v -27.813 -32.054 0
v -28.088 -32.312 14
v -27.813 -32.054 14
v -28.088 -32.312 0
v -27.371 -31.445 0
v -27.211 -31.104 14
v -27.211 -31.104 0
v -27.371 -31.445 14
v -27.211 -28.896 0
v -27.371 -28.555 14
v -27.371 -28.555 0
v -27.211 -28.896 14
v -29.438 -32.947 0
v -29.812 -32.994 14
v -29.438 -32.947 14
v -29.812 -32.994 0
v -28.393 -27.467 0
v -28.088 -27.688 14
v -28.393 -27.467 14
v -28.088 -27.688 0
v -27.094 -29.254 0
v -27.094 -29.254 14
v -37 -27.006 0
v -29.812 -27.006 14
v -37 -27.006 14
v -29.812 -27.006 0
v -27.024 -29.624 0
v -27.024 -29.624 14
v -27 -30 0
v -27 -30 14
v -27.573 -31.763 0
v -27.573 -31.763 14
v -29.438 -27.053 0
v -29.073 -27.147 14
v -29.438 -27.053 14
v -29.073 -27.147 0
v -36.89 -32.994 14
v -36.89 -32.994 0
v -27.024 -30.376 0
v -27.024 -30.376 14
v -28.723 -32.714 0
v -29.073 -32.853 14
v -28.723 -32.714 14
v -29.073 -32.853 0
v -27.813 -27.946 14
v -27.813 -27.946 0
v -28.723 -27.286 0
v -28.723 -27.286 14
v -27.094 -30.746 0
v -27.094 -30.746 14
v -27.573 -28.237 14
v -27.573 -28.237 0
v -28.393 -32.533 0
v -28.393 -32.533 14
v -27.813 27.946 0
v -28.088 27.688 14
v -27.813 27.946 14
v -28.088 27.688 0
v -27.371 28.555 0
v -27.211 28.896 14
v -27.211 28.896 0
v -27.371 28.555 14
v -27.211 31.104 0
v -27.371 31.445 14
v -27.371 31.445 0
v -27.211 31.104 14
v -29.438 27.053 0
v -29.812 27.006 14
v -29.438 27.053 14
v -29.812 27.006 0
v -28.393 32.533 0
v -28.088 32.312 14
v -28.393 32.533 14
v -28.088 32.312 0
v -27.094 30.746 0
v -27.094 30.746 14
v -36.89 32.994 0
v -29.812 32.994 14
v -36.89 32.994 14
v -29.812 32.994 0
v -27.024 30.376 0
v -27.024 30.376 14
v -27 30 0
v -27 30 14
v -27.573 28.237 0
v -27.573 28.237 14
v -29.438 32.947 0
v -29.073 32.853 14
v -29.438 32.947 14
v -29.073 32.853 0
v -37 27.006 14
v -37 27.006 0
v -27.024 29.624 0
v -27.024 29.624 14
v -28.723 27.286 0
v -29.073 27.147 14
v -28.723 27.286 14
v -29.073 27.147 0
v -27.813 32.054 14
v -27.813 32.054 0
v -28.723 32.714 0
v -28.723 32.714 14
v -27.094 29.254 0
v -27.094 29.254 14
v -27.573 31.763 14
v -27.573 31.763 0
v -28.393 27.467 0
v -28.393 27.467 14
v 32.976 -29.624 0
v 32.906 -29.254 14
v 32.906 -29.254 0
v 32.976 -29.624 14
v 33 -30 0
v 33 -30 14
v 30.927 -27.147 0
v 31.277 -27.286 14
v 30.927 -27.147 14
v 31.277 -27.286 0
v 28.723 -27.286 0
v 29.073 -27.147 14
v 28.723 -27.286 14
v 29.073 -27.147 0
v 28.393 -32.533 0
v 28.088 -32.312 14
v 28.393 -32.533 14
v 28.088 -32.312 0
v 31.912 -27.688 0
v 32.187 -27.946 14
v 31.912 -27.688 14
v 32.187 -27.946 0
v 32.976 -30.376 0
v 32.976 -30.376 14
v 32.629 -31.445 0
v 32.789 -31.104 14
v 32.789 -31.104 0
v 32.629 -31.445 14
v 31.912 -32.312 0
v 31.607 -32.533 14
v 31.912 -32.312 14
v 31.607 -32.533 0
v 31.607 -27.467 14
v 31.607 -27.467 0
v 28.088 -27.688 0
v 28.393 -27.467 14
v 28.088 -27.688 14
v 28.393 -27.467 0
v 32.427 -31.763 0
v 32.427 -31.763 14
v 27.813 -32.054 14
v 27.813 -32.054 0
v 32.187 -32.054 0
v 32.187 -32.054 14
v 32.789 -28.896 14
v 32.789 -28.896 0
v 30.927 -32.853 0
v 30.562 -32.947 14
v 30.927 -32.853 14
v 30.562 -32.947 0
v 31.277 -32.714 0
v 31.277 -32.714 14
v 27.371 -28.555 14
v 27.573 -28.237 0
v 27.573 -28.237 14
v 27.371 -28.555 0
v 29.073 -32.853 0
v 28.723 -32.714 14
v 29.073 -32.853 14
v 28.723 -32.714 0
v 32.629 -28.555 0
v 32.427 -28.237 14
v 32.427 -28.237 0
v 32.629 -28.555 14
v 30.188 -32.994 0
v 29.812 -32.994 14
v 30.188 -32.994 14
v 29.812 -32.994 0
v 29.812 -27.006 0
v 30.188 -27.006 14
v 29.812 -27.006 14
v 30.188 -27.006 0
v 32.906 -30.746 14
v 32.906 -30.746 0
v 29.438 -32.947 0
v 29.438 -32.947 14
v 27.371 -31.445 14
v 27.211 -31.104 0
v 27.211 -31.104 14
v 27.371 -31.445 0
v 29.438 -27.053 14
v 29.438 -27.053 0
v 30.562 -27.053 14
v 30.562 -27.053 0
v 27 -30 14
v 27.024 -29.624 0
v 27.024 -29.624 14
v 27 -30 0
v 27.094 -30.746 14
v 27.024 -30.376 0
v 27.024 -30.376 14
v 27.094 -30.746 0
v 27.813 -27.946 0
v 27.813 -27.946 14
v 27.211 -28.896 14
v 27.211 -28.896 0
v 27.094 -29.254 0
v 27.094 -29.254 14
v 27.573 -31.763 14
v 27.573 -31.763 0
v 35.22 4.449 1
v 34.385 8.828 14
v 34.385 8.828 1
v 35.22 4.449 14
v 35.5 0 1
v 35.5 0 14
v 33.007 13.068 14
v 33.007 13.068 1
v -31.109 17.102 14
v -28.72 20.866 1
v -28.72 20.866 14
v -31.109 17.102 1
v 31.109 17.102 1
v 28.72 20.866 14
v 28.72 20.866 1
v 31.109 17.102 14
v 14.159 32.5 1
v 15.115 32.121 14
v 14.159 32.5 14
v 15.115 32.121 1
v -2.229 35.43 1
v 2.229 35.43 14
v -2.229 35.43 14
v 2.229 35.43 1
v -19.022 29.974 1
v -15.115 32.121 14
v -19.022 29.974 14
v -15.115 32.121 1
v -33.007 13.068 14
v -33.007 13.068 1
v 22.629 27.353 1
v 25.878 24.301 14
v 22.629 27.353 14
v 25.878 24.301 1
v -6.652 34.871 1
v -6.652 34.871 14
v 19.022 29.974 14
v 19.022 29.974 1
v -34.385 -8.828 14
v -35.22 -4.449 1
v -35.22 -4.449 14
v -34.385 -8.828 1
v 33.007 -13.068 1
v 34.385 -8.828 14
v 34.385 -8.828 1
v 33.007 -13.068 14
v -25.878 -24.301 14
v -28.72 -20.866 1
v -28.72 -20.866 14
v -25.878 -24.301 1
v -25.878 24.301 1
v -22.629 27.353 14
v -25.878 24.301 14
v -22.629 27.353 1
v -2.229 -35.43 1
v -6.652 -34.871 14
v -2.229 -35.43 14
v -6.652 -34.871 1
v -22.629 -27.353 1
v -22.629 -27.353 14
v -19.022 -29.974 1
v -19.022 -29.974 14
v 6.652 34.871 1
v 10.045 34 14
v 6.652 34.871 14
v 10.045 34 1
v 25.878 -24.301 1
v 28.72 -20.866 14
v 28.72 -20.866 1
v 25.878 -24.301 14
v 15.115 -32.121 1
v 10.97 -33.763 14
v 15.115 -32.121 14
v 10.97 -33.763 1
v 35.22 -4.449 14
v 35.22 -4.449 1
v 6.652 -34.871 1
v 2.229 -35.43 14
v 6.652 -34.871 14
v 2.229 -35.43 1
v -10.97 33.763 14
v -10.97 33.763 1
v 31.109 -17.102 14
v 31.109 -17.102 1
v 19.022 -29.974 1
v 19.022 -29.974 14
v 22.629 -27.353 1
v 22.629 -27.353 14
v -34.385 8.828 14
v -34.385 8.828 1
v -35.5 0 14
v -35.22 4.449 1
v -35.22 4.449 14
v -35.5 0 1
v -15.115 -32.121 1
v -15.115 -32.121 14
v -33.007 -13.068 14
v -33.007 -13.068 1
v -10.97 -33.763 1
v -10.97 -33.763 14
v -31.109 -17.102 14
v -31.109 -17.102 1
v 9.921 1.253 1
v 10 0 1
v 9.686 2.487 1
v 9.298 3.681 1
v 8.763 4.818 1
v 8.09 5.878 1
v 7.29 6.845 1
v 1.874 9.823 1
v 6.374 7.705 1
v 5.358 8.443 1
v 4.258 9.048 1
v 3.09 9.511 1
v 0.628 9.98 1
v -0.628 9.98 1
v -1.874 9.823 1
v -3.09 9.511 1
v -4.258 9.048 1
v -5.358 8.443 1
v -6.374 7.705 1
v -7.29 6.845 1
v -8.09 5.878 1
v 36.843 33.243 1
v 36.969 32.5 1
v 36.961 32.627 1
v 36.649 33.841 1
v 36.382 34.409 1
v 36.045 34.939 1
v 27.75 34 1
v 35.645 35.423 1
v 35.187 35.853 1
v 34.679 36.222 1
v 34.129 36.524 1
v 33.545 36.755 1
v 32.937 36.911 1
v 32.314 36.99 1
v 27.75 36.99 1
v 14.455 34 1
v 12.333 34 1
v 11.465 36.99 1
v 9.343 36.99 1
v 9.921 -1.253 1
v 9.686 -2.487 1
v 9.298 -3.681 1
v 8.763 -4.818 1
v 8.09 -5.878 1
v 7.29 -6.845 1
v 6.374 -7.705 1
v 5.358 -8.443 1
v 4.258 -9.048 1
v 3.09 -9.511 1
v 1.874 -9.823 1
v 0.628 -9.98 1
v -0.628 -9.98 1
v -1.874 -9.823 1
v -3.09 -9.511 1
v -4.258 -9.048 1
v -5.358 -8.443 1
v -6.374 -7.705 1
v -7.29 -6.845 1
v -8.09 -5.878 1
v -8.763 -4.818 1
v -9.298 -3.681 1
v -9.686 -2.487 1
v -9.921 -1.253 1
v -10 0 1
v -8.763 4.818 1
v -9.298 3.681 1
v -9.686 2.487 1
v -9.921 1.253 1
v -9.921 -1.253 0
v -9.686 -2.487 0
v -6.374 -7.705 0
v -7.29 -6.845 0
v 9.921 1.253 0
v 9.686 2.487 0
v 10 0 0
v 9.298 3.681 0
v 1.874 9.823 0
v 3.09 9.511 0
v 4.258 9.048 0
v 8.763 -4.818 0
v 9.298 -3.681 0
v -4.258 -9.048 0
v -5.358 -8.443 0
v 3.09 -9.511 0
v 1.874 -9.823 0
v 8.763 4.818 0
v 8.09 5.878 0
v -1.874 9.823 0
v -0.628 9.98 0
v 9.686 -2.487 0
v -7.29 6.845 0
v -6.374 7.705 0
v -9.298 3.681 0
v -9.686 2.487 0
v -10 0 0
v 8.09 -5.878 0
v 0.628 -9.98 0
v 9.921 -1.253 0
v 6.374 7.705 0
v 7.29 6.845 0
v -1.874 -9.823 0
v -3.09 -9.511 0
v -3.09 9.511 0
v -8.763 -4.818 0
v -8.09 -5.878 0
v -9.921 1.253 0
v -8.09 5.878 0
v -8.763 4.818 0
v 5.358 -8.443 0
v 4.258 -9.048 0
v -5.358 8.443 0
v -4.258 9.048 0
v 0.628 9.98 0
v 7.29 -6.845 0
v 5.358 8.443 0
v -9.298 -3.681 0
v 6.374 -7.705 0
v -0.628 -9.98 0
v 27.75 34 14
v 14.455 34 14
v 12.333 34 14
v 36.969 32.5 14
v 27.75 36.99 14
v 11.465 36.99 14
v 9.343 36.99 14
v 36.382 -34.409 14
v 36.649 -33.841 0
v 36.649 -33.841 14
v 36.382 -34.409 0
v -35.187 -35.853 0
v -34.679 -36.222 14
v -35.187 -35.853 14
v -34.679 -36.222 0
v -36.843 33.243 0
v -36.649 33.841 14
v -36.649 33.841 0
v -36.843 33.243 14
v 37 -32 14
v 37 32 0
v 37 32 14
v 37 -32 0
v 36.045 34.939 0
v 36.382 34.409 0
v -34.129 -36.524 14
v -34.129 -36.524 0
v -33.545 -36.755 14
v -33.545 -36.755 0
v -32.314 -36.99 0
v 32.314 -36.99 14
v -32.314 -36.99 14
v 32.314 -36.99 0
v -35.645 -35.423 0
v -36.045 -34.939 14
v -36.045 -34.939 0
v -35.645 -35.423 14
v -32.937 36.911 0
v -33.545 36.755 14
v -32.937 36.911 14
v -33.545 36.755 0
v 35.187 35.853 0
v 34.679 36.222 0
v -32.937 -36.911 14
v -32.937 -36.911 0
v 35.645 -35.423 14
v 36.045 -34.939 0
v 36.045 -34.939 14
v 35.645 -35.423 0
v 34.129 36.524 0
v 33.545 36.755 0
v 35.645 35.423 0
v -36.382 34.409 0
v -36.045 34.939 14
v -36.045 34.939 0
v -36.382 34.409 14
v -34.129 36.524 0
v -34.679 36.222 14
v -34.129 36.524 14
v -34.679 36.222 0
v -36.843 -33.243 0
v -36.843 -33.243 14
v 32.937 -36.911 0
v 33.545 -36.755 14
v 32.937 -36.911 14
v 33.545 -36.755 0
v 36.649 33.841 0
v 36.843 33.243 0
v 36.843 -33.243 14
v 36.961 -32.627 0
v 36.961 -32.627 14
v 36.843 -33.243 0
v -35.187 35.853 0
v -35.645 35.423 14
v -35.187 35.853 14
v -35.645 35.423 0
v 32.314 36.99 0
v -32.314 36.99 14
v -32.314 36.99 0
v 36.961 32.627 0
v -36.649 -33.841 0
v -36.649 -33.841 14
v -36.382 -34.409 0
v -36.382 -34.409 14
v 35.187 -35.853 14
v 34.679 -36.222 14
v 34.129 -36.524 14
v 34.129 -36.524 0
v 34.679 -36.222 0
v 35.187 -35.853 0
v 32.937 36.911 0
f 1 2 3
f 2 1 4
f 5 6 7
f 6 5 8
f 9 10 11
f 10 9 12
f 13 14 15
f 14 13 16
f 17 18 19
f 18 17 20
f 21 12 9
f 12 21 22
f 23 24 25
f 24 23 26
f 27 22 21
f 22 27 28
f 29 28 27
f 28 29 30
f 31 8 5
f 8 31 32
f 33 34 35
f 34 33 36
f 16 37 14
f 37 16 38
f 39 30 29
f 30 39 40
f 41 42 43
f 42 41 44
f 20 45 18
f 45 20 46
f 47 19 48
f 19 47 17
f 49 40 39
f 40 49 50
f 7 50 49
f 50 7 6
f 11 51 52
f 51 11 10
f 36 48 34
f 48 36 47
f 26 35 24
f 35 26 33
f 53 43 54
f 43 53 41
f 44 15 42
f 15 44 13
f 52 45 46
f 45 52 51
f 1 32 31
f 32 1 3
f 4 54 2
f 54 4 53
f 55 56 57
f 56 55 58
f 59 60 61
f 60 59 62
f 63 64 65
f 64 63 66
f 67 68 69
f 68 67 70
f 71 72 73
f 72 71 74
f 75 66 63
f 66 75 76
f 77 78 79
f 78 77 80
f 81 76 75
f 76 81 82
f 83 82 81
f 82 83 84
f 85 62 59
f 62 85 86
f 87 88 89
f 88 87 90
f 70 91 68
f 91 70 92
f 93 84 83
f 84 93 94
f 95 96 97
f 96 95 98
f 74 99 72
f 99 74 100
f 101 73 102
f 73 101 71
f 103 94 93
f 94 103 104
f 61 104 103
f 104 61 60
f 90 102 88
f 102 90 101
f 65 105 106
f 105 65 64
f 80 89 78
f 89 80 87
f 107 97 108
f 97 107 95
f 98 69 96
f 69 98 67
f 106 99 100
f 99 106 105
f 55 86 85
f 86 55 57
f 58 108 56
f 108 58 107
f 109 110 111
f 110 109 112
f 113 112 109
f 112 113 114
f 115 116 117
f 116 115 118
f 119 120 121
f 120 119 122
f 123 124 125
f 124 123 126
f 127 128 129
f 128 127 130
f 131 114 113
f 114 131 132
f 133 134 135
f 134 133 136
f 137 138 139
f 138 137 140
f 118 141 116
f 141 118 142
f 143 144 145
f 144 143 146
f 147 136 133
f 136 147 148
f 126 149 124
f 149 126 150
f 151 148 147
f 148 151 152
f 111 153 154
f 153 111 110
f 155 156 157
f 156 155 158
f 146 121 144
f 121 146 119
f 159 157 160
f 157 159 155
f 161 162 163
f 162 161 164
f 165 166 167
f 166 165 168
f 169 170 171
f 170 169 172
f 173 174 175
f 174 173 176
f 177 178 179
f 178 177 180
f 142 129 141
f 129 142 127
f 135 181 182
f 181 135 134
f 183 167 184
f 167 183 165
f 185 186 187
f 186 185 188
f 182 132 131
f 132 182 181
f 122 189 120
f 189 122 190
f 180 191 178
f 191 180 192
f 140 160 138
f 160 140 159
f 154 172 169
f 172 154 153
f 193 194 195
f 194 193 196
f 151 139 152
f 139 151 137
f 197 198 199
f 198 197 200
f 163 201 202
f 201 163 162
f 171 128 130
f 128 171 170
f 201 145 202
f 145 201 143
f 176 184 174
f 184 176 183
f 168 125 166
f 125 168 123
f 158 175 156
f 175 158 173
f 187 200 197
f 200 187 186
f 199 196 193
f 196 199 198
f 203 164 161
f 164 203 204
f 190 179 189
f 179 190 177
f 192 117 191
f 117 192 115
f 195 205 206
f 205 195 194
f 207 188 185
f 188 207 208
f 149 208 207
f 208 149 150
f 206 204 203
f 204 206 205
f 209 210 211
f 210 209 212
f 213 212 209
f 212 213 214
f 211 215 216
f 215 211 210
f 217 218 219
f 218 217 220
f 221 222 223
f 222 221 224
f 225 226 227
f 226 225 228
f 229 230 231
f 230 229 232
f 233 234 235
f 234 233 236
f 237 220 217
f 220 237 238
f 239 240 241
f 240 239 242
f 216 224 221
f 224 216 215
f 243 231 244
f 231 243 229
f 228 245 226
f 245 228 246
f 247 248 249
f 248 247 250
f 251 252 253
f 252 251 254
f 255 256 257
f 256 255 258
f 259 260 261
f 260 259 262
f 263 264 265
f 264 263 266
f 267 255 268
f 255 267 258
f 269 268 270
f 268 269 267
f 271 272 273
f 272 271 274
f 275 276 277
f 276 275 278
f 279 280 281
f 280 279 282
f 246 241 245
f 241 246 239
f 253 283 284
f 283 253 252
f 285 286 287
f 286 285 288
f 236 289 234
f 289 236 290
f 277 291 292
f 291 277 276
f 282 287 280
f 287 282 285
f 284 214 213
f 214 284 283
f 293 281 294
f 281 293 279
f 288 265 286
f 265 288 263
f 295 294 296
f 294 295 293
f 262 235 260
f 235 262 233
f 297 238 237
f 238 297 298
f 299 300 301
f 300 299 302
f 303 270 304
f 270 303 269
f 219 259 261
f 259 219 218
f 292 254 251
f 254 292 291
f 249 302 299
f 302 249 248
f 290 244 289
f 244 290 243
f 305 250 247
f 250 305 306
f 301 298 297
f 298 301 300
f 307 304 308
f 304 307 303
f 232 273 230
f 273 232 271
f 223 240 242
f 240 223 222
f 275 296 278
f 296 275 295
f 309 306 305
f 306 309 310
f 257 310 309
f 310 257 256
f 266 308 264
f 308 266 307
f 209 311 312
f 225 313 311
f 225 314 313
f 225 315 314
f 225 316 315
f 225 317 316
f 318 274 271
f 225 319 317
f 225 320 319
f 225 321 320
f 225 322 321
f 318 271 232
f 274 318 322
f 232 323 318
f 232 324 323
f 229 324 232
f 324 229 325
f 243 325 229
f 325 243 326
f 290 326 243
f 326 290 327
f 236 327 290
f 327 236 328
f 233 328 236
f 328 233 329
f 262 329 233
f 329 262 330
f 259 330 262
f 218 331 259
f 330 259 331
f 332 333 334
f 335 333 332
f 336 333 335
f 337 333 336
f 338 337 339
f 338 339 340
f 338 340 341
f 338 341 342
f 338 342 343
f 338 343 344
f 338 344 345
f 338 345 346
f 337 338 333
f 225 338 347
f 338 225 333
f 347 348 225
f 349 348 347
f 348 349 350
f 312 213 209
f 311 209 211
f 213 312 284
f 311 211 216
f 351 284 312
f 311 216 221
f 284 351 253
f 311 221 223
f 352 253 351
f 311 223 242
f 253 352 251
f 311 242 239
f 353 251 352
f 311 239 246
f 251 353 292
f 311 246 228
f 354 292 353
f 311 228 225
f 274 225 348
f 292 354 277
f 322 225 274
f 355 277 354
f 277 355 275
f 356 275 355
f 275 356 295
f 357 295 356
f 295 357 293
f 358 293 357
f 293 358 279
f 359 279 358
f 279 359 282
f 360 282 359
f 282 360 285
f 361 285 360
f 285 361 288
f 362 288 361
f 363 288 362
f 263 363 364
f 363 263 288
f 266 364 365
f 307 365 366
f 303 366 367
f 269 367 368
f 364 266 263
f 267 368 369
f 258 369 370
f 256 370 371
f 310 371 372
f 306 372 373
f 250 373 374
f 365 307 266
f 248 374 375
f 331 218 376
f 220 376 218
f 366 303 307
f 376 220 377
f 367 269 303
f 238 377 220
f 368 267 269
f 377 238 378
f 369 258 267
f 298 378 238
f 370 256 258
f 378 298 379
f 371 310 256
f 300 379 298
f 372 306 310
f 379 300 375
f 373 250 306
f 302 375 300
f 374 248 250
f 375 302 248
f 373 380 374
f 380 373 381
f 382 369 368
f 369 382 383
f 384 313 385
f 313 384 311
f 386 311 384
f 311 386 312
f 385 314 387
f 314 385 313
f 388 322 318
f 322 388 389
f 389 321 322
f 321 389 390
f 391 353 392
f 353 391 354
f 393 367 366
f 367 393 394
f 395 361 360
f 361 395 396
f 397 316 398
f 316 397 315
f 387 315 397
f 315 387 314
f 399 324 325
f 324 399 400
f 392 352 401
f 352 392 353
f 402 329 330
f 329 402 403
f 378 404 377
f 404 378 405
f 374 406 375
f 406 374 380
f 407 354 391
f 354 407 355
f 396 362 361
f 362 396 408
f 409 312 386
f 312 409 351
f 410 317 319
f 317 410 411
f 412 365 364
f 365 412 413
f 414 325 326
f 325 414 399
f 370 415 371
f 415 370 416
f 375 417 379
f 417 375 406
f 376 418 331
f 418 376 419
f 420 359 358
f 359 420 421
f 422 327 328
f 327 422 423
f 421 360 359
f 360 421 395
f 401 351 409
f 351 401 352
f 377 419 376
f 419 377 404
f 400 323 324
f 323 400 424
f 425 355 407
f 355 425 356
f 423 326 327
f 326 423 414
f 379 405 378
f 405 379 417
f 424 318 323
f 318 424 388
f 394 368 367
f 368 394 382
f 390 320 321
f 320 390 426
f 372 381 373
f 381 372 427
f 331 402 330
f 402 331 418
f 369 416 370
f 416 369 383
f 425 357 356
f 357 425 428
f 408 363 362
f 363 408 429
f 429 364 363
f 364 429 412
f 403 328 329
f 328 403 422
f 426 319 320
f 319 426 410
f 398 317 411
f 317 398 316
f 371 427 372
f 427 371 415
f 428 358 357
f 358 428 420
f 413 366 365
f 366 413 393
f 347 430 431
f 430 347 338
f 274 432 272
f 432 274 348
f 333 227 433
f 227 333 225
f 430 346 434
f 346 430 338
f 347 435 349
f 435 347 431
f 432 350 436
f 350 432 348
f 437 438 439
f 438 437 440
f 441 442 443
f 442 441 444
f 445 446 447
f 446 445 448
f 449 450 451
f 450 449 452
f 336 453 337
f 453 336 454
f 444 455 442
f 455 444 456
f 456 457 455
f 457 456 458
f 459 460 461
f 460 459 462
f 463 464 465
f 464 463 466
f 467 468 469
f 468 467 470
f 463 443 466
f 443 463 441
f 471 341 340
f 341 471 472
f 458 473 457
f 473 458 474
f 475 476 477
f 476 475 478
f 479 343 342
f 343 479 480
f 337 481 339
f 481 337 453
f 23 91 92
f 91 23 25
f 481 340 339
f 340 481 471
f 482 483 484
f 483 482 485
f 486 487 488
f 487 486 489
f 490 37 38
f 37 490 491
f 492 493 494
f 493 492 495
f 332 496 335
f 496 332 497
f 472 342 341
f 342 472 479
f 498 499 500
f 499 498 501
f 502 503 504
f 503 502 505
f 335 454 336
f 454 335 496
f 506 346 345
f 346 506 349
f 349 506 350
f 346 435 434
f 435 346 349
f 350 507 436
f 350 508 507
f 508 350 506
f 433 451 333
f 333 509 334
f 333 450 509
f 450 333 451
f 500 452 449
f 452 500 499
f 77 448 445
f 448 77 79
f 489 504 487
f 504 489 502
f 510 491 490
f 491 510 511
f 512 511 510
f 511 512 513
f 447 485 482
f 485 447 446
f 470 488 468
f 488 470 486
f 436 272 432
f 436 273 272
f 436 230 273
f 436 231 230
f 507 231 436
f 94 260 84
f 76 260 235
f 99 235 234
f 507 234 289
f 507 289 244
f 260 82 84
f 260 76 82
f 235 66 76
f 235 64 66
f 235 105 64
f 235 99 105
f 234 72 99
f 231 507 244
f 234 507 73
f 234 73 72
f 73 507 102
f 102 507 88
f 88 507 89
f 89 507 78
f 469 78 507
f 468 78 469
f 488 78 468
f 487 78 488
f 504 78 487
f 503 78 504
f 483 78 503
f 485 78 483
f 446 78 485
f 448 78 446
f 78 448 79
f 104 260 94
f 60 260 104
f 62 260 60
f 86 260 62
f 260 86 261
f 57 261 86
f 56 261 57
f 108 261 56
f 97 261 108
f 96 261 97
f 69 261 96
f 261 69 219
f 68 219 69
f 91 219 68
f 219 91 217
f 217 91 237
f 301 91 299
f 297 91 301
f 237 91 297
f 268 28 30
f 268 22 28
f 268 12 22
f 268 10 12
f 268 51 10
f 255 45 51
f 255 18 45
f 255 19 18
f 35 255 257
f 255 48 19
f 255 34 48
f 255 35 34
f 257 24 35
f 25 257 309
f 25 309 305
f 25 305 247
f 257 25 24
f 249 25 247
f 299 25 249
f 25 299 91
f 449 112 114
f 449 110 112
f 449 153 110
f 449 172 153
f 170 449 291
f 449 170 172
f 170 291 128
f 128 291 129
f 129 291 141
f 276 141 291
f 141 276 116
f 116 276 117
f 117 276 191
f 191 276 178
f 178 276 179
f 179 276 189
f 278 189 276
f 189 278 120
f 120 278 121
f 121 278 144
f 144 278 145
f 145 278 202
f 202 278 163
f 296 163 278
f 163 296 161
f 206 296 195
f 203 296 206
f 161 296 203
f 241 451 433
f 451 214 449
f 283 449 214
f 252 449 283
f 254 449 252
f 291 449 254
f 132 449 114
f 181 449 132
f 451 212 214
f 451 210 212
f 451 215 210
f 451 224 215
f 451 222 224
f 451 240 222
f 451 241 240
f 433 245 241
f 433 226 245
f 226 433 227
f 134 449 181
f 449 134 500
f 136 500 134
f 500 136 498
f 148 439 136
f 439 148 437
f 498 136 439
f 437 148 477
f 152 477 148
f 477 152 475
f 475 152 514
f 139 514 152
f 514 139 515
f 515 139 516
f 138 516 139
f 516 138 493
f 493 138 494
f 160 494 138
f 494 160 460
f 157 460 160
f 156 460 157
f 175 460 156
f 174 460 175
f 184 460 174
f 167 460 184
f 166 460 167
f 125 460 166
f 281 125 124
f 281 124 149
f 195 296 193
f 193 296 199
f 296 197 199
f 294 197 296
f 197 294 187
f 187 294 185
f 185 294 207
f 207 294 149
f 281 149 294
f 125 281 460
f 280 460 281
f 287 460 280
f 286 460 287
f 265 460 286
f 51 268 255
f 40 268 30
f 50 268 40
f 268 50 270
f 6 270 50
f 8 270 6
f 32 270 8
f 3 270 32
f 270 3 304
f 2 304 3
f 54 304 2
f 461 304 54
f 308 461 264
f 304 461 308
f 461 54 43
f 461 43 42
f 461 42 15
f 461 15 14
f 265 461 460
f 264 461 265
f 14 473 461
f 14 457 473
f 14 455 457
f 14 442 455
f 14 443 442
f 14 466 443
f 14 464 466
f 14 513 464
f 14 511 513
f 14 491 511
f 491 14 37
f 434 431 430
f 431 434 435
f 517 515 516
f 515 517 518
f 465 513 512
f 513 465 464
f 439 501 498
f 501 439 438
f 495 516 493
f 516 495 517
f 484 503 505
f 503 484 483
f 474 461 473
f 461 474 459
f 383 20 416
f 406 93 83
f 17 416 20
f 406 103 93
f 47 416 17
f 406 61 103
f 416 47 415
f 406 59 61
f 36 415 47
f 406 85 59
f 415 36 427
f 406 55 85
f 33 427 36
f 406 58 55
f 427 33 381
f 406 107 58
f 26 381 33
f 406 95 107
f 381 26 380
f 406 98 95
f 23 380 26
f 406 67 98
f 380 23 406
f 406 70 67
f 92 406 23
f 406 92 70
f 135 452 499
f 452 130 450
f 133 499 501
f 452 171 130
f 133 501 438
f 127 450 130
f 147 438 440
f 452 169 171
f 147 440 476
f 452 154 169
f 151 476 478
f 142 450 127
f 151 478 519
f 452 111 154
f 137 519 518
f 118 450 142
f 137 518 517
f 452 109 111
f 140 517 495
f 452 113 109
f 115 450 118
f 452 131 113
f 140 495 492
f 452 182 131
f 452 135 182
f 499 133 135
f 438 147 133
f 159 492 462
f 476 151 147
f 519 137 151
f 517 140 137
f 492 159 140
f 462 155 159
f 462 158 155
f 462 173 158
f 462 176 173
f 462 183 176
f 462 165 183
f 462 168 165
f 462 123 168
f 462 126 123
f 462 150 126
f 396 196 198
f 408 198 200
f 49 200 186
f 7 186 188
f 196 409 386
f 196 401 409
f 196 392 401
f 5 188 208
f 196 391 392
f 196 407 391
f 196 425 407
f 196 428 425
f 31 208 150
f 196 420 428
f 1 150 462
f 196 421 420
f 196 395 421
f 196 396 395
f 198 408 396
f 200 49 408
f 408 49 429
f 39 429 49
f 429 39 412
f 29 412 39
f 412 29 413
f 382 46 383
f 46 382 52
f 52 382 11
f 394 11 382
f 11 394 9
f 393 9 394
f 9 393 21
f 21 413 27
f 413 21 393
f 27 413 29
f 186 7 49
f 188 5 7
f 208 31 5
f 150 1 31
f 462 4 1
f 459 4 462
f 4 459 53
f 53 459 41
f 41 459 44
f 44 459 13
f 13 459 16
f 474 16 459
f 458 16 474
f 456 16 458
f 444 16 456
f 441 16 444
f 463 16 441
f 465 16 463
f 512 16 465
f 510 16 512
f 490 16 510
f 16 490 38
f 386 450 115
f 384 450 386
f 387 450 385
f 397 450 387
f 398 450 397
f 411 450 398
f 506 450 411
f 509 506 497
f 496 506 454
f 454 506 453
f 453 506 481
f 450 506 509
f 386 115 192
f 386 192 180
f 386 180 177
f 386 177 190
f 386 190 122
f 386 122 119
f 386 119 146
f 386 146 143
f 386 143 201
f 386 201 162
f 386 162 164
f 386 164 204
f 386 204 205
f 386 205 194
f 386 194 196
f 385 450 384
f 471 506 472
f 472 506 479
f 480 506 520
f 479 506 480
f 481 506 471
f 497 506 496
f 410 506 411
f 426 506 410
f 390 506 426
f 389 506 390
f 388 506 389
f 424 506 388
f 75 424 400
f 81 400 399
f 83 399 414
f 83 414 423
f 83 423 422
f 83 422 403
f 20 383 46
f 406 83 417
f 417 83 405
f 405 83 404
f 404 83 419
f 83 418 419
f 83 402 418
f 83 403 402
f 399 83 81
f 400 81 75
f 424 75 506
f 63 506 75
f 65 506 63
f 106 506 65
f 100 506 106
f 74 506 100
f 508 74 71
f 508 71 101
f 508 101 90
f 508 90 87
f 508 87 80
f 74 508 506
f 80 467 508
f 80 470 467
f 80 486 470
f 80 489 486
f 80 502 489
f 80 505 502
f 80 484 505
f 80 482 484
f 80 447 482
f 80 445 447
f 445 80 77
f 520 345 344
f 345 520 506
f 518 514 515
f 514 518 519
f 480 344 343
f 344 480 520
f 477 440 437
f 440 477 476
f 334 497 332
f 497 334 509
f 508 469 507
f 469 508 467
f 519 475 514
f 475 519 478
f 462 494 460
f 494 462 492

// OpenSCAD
$fn = 50;


difference() {
	union() {
		translate(v = [0, 0, 0]) {
			rotate(a = [0, 0, 0]) {
				hull() {
					translate(v = [-32.0000000000, 32.0000000000, 0]) {
						rotate(a = [0, 0, 0]) {
							translate(v = [0, 0, 0]) {
								rotate(a = [0, 0, 0]) {
									cylinder(h = 14, r = 5);
								}
							}
						}
					}
					translate(v = [32.0000000000, 32.0000000000, 0]) {
						rotate(a = [0, 0, 0]) {
							translate(v = [0, 0, 0]) {
								rotate(a = [0, 0, 0]) {
									cylinder(h = 14, r = 5);
								}
							}
						}
					}
					translate(v = [-32.0000000000, -32.0000000000, 0]) {
						rotate(a = [0, 0, 0]) {
							translate(v = [0, 0, 0]) {
								rotate(a = [0, 0, 0]) {
									cylinder(h = 14, r = 5);
								}
							}
						}
					}
					translate(v = [32.0000000000, -32.0000000000, 0]) {
						rotate(a = [0, 0, 0]) {
							translate(v = [0, 0, 0]) {
								rotate(a = [0, 0, 0]) {
									cylinder(h = 14, r = 5);
								}
							}
						}
					}
				}
			}
		}
	}
	union() {
		translate(v = [-37.5000000000, -30.0000000000, -125]) {
			rotate(a = [0, 0, 0]) {
				hull() {
					translate(v = [7.5000000000, 0, 0]) {
						rotate(a = [0, 0, 0]) {
							translate(v = [0, 0, 0]) {
								rotate(a = [0, 0, 0]) {
									cylinder(h = 250, r = 3.0000000000);
								}
							}
						}
					}
					translate(v = [-7.5000000000, 0, 0]) {
						rotate(a = [0, 0, 0]) {
							translate(v = [0, 0, 0]) {
								rotate(a = [0, 0, 0]) {
									cylinder(h = 250, r = 3.0000000000);
								}
							}
						}
					}
				}
			}
		}
		translate(v = [-37.5000000000, 30.0000000000, -125]) {
			rotate(a = [0, 0, 0]) {
				hull() {
					translate(v = [7.5000000000, 0, 0]) {
						rotate(a = [0, 0, 0]) {
							translate(v = [0, 0, 0]) {
								rotate(a = [0, 0, 0]) {
									cylinder(h = 250, r = 3.0000000000);
								}
							}
						}
					}
					translate(v = [-7.5000000000, 0, 0]) {
						rotate(a = [0, 0, 0]) {
							translate(v = [0, 0, 0]) {
								rotate(a = [0, 0, 0]) {
									cylinder(h = 250, r = 3.0000000000);
								}
							}
						}
					}
				}
			}
		}
		translate(v = [30.0000000000, -30.0000000000, -125.0000000000]) {
			rotate(a = [0, 0, 0]) {
				cylinder(h = 250, r = 3.0000000000);
			}
		}
		translate(v = [0, 0, 1.0000000000]) {
			rotate(a = [0, 0, 0]) {
				cylinder(h = 16, r = 35.5000000000);
			}
		}
		translate(v = [0, 0, -7.0000000000]) {
			rotate(a = [0, 0, 0]) {
				cylinder(h = 14, r = 10.0000000000);
			}
		}
		translate(v = [0.0000000000, 32.5000000000, 1]) {
			rotate(a = [0, 0, 0]) {
				cube(size = [37.0000000000, 1.5000000000, 16]);
			}
		}
		translate(v = [27.7500000000, 32.5000000000, 1]) {
			rotate(a = [0, 0, 0]) {
				cube(size = [9.2500000000, 4.5000000000, 16]);
			}
		}
		translate(v = [8.5833333333, 37.7500000000, 1]) {
			rotate(a = [0, 0, -45]) {
				cube(size = [7.5000000000, 1.5000000000, 16]);
			}
		}
	}
}
